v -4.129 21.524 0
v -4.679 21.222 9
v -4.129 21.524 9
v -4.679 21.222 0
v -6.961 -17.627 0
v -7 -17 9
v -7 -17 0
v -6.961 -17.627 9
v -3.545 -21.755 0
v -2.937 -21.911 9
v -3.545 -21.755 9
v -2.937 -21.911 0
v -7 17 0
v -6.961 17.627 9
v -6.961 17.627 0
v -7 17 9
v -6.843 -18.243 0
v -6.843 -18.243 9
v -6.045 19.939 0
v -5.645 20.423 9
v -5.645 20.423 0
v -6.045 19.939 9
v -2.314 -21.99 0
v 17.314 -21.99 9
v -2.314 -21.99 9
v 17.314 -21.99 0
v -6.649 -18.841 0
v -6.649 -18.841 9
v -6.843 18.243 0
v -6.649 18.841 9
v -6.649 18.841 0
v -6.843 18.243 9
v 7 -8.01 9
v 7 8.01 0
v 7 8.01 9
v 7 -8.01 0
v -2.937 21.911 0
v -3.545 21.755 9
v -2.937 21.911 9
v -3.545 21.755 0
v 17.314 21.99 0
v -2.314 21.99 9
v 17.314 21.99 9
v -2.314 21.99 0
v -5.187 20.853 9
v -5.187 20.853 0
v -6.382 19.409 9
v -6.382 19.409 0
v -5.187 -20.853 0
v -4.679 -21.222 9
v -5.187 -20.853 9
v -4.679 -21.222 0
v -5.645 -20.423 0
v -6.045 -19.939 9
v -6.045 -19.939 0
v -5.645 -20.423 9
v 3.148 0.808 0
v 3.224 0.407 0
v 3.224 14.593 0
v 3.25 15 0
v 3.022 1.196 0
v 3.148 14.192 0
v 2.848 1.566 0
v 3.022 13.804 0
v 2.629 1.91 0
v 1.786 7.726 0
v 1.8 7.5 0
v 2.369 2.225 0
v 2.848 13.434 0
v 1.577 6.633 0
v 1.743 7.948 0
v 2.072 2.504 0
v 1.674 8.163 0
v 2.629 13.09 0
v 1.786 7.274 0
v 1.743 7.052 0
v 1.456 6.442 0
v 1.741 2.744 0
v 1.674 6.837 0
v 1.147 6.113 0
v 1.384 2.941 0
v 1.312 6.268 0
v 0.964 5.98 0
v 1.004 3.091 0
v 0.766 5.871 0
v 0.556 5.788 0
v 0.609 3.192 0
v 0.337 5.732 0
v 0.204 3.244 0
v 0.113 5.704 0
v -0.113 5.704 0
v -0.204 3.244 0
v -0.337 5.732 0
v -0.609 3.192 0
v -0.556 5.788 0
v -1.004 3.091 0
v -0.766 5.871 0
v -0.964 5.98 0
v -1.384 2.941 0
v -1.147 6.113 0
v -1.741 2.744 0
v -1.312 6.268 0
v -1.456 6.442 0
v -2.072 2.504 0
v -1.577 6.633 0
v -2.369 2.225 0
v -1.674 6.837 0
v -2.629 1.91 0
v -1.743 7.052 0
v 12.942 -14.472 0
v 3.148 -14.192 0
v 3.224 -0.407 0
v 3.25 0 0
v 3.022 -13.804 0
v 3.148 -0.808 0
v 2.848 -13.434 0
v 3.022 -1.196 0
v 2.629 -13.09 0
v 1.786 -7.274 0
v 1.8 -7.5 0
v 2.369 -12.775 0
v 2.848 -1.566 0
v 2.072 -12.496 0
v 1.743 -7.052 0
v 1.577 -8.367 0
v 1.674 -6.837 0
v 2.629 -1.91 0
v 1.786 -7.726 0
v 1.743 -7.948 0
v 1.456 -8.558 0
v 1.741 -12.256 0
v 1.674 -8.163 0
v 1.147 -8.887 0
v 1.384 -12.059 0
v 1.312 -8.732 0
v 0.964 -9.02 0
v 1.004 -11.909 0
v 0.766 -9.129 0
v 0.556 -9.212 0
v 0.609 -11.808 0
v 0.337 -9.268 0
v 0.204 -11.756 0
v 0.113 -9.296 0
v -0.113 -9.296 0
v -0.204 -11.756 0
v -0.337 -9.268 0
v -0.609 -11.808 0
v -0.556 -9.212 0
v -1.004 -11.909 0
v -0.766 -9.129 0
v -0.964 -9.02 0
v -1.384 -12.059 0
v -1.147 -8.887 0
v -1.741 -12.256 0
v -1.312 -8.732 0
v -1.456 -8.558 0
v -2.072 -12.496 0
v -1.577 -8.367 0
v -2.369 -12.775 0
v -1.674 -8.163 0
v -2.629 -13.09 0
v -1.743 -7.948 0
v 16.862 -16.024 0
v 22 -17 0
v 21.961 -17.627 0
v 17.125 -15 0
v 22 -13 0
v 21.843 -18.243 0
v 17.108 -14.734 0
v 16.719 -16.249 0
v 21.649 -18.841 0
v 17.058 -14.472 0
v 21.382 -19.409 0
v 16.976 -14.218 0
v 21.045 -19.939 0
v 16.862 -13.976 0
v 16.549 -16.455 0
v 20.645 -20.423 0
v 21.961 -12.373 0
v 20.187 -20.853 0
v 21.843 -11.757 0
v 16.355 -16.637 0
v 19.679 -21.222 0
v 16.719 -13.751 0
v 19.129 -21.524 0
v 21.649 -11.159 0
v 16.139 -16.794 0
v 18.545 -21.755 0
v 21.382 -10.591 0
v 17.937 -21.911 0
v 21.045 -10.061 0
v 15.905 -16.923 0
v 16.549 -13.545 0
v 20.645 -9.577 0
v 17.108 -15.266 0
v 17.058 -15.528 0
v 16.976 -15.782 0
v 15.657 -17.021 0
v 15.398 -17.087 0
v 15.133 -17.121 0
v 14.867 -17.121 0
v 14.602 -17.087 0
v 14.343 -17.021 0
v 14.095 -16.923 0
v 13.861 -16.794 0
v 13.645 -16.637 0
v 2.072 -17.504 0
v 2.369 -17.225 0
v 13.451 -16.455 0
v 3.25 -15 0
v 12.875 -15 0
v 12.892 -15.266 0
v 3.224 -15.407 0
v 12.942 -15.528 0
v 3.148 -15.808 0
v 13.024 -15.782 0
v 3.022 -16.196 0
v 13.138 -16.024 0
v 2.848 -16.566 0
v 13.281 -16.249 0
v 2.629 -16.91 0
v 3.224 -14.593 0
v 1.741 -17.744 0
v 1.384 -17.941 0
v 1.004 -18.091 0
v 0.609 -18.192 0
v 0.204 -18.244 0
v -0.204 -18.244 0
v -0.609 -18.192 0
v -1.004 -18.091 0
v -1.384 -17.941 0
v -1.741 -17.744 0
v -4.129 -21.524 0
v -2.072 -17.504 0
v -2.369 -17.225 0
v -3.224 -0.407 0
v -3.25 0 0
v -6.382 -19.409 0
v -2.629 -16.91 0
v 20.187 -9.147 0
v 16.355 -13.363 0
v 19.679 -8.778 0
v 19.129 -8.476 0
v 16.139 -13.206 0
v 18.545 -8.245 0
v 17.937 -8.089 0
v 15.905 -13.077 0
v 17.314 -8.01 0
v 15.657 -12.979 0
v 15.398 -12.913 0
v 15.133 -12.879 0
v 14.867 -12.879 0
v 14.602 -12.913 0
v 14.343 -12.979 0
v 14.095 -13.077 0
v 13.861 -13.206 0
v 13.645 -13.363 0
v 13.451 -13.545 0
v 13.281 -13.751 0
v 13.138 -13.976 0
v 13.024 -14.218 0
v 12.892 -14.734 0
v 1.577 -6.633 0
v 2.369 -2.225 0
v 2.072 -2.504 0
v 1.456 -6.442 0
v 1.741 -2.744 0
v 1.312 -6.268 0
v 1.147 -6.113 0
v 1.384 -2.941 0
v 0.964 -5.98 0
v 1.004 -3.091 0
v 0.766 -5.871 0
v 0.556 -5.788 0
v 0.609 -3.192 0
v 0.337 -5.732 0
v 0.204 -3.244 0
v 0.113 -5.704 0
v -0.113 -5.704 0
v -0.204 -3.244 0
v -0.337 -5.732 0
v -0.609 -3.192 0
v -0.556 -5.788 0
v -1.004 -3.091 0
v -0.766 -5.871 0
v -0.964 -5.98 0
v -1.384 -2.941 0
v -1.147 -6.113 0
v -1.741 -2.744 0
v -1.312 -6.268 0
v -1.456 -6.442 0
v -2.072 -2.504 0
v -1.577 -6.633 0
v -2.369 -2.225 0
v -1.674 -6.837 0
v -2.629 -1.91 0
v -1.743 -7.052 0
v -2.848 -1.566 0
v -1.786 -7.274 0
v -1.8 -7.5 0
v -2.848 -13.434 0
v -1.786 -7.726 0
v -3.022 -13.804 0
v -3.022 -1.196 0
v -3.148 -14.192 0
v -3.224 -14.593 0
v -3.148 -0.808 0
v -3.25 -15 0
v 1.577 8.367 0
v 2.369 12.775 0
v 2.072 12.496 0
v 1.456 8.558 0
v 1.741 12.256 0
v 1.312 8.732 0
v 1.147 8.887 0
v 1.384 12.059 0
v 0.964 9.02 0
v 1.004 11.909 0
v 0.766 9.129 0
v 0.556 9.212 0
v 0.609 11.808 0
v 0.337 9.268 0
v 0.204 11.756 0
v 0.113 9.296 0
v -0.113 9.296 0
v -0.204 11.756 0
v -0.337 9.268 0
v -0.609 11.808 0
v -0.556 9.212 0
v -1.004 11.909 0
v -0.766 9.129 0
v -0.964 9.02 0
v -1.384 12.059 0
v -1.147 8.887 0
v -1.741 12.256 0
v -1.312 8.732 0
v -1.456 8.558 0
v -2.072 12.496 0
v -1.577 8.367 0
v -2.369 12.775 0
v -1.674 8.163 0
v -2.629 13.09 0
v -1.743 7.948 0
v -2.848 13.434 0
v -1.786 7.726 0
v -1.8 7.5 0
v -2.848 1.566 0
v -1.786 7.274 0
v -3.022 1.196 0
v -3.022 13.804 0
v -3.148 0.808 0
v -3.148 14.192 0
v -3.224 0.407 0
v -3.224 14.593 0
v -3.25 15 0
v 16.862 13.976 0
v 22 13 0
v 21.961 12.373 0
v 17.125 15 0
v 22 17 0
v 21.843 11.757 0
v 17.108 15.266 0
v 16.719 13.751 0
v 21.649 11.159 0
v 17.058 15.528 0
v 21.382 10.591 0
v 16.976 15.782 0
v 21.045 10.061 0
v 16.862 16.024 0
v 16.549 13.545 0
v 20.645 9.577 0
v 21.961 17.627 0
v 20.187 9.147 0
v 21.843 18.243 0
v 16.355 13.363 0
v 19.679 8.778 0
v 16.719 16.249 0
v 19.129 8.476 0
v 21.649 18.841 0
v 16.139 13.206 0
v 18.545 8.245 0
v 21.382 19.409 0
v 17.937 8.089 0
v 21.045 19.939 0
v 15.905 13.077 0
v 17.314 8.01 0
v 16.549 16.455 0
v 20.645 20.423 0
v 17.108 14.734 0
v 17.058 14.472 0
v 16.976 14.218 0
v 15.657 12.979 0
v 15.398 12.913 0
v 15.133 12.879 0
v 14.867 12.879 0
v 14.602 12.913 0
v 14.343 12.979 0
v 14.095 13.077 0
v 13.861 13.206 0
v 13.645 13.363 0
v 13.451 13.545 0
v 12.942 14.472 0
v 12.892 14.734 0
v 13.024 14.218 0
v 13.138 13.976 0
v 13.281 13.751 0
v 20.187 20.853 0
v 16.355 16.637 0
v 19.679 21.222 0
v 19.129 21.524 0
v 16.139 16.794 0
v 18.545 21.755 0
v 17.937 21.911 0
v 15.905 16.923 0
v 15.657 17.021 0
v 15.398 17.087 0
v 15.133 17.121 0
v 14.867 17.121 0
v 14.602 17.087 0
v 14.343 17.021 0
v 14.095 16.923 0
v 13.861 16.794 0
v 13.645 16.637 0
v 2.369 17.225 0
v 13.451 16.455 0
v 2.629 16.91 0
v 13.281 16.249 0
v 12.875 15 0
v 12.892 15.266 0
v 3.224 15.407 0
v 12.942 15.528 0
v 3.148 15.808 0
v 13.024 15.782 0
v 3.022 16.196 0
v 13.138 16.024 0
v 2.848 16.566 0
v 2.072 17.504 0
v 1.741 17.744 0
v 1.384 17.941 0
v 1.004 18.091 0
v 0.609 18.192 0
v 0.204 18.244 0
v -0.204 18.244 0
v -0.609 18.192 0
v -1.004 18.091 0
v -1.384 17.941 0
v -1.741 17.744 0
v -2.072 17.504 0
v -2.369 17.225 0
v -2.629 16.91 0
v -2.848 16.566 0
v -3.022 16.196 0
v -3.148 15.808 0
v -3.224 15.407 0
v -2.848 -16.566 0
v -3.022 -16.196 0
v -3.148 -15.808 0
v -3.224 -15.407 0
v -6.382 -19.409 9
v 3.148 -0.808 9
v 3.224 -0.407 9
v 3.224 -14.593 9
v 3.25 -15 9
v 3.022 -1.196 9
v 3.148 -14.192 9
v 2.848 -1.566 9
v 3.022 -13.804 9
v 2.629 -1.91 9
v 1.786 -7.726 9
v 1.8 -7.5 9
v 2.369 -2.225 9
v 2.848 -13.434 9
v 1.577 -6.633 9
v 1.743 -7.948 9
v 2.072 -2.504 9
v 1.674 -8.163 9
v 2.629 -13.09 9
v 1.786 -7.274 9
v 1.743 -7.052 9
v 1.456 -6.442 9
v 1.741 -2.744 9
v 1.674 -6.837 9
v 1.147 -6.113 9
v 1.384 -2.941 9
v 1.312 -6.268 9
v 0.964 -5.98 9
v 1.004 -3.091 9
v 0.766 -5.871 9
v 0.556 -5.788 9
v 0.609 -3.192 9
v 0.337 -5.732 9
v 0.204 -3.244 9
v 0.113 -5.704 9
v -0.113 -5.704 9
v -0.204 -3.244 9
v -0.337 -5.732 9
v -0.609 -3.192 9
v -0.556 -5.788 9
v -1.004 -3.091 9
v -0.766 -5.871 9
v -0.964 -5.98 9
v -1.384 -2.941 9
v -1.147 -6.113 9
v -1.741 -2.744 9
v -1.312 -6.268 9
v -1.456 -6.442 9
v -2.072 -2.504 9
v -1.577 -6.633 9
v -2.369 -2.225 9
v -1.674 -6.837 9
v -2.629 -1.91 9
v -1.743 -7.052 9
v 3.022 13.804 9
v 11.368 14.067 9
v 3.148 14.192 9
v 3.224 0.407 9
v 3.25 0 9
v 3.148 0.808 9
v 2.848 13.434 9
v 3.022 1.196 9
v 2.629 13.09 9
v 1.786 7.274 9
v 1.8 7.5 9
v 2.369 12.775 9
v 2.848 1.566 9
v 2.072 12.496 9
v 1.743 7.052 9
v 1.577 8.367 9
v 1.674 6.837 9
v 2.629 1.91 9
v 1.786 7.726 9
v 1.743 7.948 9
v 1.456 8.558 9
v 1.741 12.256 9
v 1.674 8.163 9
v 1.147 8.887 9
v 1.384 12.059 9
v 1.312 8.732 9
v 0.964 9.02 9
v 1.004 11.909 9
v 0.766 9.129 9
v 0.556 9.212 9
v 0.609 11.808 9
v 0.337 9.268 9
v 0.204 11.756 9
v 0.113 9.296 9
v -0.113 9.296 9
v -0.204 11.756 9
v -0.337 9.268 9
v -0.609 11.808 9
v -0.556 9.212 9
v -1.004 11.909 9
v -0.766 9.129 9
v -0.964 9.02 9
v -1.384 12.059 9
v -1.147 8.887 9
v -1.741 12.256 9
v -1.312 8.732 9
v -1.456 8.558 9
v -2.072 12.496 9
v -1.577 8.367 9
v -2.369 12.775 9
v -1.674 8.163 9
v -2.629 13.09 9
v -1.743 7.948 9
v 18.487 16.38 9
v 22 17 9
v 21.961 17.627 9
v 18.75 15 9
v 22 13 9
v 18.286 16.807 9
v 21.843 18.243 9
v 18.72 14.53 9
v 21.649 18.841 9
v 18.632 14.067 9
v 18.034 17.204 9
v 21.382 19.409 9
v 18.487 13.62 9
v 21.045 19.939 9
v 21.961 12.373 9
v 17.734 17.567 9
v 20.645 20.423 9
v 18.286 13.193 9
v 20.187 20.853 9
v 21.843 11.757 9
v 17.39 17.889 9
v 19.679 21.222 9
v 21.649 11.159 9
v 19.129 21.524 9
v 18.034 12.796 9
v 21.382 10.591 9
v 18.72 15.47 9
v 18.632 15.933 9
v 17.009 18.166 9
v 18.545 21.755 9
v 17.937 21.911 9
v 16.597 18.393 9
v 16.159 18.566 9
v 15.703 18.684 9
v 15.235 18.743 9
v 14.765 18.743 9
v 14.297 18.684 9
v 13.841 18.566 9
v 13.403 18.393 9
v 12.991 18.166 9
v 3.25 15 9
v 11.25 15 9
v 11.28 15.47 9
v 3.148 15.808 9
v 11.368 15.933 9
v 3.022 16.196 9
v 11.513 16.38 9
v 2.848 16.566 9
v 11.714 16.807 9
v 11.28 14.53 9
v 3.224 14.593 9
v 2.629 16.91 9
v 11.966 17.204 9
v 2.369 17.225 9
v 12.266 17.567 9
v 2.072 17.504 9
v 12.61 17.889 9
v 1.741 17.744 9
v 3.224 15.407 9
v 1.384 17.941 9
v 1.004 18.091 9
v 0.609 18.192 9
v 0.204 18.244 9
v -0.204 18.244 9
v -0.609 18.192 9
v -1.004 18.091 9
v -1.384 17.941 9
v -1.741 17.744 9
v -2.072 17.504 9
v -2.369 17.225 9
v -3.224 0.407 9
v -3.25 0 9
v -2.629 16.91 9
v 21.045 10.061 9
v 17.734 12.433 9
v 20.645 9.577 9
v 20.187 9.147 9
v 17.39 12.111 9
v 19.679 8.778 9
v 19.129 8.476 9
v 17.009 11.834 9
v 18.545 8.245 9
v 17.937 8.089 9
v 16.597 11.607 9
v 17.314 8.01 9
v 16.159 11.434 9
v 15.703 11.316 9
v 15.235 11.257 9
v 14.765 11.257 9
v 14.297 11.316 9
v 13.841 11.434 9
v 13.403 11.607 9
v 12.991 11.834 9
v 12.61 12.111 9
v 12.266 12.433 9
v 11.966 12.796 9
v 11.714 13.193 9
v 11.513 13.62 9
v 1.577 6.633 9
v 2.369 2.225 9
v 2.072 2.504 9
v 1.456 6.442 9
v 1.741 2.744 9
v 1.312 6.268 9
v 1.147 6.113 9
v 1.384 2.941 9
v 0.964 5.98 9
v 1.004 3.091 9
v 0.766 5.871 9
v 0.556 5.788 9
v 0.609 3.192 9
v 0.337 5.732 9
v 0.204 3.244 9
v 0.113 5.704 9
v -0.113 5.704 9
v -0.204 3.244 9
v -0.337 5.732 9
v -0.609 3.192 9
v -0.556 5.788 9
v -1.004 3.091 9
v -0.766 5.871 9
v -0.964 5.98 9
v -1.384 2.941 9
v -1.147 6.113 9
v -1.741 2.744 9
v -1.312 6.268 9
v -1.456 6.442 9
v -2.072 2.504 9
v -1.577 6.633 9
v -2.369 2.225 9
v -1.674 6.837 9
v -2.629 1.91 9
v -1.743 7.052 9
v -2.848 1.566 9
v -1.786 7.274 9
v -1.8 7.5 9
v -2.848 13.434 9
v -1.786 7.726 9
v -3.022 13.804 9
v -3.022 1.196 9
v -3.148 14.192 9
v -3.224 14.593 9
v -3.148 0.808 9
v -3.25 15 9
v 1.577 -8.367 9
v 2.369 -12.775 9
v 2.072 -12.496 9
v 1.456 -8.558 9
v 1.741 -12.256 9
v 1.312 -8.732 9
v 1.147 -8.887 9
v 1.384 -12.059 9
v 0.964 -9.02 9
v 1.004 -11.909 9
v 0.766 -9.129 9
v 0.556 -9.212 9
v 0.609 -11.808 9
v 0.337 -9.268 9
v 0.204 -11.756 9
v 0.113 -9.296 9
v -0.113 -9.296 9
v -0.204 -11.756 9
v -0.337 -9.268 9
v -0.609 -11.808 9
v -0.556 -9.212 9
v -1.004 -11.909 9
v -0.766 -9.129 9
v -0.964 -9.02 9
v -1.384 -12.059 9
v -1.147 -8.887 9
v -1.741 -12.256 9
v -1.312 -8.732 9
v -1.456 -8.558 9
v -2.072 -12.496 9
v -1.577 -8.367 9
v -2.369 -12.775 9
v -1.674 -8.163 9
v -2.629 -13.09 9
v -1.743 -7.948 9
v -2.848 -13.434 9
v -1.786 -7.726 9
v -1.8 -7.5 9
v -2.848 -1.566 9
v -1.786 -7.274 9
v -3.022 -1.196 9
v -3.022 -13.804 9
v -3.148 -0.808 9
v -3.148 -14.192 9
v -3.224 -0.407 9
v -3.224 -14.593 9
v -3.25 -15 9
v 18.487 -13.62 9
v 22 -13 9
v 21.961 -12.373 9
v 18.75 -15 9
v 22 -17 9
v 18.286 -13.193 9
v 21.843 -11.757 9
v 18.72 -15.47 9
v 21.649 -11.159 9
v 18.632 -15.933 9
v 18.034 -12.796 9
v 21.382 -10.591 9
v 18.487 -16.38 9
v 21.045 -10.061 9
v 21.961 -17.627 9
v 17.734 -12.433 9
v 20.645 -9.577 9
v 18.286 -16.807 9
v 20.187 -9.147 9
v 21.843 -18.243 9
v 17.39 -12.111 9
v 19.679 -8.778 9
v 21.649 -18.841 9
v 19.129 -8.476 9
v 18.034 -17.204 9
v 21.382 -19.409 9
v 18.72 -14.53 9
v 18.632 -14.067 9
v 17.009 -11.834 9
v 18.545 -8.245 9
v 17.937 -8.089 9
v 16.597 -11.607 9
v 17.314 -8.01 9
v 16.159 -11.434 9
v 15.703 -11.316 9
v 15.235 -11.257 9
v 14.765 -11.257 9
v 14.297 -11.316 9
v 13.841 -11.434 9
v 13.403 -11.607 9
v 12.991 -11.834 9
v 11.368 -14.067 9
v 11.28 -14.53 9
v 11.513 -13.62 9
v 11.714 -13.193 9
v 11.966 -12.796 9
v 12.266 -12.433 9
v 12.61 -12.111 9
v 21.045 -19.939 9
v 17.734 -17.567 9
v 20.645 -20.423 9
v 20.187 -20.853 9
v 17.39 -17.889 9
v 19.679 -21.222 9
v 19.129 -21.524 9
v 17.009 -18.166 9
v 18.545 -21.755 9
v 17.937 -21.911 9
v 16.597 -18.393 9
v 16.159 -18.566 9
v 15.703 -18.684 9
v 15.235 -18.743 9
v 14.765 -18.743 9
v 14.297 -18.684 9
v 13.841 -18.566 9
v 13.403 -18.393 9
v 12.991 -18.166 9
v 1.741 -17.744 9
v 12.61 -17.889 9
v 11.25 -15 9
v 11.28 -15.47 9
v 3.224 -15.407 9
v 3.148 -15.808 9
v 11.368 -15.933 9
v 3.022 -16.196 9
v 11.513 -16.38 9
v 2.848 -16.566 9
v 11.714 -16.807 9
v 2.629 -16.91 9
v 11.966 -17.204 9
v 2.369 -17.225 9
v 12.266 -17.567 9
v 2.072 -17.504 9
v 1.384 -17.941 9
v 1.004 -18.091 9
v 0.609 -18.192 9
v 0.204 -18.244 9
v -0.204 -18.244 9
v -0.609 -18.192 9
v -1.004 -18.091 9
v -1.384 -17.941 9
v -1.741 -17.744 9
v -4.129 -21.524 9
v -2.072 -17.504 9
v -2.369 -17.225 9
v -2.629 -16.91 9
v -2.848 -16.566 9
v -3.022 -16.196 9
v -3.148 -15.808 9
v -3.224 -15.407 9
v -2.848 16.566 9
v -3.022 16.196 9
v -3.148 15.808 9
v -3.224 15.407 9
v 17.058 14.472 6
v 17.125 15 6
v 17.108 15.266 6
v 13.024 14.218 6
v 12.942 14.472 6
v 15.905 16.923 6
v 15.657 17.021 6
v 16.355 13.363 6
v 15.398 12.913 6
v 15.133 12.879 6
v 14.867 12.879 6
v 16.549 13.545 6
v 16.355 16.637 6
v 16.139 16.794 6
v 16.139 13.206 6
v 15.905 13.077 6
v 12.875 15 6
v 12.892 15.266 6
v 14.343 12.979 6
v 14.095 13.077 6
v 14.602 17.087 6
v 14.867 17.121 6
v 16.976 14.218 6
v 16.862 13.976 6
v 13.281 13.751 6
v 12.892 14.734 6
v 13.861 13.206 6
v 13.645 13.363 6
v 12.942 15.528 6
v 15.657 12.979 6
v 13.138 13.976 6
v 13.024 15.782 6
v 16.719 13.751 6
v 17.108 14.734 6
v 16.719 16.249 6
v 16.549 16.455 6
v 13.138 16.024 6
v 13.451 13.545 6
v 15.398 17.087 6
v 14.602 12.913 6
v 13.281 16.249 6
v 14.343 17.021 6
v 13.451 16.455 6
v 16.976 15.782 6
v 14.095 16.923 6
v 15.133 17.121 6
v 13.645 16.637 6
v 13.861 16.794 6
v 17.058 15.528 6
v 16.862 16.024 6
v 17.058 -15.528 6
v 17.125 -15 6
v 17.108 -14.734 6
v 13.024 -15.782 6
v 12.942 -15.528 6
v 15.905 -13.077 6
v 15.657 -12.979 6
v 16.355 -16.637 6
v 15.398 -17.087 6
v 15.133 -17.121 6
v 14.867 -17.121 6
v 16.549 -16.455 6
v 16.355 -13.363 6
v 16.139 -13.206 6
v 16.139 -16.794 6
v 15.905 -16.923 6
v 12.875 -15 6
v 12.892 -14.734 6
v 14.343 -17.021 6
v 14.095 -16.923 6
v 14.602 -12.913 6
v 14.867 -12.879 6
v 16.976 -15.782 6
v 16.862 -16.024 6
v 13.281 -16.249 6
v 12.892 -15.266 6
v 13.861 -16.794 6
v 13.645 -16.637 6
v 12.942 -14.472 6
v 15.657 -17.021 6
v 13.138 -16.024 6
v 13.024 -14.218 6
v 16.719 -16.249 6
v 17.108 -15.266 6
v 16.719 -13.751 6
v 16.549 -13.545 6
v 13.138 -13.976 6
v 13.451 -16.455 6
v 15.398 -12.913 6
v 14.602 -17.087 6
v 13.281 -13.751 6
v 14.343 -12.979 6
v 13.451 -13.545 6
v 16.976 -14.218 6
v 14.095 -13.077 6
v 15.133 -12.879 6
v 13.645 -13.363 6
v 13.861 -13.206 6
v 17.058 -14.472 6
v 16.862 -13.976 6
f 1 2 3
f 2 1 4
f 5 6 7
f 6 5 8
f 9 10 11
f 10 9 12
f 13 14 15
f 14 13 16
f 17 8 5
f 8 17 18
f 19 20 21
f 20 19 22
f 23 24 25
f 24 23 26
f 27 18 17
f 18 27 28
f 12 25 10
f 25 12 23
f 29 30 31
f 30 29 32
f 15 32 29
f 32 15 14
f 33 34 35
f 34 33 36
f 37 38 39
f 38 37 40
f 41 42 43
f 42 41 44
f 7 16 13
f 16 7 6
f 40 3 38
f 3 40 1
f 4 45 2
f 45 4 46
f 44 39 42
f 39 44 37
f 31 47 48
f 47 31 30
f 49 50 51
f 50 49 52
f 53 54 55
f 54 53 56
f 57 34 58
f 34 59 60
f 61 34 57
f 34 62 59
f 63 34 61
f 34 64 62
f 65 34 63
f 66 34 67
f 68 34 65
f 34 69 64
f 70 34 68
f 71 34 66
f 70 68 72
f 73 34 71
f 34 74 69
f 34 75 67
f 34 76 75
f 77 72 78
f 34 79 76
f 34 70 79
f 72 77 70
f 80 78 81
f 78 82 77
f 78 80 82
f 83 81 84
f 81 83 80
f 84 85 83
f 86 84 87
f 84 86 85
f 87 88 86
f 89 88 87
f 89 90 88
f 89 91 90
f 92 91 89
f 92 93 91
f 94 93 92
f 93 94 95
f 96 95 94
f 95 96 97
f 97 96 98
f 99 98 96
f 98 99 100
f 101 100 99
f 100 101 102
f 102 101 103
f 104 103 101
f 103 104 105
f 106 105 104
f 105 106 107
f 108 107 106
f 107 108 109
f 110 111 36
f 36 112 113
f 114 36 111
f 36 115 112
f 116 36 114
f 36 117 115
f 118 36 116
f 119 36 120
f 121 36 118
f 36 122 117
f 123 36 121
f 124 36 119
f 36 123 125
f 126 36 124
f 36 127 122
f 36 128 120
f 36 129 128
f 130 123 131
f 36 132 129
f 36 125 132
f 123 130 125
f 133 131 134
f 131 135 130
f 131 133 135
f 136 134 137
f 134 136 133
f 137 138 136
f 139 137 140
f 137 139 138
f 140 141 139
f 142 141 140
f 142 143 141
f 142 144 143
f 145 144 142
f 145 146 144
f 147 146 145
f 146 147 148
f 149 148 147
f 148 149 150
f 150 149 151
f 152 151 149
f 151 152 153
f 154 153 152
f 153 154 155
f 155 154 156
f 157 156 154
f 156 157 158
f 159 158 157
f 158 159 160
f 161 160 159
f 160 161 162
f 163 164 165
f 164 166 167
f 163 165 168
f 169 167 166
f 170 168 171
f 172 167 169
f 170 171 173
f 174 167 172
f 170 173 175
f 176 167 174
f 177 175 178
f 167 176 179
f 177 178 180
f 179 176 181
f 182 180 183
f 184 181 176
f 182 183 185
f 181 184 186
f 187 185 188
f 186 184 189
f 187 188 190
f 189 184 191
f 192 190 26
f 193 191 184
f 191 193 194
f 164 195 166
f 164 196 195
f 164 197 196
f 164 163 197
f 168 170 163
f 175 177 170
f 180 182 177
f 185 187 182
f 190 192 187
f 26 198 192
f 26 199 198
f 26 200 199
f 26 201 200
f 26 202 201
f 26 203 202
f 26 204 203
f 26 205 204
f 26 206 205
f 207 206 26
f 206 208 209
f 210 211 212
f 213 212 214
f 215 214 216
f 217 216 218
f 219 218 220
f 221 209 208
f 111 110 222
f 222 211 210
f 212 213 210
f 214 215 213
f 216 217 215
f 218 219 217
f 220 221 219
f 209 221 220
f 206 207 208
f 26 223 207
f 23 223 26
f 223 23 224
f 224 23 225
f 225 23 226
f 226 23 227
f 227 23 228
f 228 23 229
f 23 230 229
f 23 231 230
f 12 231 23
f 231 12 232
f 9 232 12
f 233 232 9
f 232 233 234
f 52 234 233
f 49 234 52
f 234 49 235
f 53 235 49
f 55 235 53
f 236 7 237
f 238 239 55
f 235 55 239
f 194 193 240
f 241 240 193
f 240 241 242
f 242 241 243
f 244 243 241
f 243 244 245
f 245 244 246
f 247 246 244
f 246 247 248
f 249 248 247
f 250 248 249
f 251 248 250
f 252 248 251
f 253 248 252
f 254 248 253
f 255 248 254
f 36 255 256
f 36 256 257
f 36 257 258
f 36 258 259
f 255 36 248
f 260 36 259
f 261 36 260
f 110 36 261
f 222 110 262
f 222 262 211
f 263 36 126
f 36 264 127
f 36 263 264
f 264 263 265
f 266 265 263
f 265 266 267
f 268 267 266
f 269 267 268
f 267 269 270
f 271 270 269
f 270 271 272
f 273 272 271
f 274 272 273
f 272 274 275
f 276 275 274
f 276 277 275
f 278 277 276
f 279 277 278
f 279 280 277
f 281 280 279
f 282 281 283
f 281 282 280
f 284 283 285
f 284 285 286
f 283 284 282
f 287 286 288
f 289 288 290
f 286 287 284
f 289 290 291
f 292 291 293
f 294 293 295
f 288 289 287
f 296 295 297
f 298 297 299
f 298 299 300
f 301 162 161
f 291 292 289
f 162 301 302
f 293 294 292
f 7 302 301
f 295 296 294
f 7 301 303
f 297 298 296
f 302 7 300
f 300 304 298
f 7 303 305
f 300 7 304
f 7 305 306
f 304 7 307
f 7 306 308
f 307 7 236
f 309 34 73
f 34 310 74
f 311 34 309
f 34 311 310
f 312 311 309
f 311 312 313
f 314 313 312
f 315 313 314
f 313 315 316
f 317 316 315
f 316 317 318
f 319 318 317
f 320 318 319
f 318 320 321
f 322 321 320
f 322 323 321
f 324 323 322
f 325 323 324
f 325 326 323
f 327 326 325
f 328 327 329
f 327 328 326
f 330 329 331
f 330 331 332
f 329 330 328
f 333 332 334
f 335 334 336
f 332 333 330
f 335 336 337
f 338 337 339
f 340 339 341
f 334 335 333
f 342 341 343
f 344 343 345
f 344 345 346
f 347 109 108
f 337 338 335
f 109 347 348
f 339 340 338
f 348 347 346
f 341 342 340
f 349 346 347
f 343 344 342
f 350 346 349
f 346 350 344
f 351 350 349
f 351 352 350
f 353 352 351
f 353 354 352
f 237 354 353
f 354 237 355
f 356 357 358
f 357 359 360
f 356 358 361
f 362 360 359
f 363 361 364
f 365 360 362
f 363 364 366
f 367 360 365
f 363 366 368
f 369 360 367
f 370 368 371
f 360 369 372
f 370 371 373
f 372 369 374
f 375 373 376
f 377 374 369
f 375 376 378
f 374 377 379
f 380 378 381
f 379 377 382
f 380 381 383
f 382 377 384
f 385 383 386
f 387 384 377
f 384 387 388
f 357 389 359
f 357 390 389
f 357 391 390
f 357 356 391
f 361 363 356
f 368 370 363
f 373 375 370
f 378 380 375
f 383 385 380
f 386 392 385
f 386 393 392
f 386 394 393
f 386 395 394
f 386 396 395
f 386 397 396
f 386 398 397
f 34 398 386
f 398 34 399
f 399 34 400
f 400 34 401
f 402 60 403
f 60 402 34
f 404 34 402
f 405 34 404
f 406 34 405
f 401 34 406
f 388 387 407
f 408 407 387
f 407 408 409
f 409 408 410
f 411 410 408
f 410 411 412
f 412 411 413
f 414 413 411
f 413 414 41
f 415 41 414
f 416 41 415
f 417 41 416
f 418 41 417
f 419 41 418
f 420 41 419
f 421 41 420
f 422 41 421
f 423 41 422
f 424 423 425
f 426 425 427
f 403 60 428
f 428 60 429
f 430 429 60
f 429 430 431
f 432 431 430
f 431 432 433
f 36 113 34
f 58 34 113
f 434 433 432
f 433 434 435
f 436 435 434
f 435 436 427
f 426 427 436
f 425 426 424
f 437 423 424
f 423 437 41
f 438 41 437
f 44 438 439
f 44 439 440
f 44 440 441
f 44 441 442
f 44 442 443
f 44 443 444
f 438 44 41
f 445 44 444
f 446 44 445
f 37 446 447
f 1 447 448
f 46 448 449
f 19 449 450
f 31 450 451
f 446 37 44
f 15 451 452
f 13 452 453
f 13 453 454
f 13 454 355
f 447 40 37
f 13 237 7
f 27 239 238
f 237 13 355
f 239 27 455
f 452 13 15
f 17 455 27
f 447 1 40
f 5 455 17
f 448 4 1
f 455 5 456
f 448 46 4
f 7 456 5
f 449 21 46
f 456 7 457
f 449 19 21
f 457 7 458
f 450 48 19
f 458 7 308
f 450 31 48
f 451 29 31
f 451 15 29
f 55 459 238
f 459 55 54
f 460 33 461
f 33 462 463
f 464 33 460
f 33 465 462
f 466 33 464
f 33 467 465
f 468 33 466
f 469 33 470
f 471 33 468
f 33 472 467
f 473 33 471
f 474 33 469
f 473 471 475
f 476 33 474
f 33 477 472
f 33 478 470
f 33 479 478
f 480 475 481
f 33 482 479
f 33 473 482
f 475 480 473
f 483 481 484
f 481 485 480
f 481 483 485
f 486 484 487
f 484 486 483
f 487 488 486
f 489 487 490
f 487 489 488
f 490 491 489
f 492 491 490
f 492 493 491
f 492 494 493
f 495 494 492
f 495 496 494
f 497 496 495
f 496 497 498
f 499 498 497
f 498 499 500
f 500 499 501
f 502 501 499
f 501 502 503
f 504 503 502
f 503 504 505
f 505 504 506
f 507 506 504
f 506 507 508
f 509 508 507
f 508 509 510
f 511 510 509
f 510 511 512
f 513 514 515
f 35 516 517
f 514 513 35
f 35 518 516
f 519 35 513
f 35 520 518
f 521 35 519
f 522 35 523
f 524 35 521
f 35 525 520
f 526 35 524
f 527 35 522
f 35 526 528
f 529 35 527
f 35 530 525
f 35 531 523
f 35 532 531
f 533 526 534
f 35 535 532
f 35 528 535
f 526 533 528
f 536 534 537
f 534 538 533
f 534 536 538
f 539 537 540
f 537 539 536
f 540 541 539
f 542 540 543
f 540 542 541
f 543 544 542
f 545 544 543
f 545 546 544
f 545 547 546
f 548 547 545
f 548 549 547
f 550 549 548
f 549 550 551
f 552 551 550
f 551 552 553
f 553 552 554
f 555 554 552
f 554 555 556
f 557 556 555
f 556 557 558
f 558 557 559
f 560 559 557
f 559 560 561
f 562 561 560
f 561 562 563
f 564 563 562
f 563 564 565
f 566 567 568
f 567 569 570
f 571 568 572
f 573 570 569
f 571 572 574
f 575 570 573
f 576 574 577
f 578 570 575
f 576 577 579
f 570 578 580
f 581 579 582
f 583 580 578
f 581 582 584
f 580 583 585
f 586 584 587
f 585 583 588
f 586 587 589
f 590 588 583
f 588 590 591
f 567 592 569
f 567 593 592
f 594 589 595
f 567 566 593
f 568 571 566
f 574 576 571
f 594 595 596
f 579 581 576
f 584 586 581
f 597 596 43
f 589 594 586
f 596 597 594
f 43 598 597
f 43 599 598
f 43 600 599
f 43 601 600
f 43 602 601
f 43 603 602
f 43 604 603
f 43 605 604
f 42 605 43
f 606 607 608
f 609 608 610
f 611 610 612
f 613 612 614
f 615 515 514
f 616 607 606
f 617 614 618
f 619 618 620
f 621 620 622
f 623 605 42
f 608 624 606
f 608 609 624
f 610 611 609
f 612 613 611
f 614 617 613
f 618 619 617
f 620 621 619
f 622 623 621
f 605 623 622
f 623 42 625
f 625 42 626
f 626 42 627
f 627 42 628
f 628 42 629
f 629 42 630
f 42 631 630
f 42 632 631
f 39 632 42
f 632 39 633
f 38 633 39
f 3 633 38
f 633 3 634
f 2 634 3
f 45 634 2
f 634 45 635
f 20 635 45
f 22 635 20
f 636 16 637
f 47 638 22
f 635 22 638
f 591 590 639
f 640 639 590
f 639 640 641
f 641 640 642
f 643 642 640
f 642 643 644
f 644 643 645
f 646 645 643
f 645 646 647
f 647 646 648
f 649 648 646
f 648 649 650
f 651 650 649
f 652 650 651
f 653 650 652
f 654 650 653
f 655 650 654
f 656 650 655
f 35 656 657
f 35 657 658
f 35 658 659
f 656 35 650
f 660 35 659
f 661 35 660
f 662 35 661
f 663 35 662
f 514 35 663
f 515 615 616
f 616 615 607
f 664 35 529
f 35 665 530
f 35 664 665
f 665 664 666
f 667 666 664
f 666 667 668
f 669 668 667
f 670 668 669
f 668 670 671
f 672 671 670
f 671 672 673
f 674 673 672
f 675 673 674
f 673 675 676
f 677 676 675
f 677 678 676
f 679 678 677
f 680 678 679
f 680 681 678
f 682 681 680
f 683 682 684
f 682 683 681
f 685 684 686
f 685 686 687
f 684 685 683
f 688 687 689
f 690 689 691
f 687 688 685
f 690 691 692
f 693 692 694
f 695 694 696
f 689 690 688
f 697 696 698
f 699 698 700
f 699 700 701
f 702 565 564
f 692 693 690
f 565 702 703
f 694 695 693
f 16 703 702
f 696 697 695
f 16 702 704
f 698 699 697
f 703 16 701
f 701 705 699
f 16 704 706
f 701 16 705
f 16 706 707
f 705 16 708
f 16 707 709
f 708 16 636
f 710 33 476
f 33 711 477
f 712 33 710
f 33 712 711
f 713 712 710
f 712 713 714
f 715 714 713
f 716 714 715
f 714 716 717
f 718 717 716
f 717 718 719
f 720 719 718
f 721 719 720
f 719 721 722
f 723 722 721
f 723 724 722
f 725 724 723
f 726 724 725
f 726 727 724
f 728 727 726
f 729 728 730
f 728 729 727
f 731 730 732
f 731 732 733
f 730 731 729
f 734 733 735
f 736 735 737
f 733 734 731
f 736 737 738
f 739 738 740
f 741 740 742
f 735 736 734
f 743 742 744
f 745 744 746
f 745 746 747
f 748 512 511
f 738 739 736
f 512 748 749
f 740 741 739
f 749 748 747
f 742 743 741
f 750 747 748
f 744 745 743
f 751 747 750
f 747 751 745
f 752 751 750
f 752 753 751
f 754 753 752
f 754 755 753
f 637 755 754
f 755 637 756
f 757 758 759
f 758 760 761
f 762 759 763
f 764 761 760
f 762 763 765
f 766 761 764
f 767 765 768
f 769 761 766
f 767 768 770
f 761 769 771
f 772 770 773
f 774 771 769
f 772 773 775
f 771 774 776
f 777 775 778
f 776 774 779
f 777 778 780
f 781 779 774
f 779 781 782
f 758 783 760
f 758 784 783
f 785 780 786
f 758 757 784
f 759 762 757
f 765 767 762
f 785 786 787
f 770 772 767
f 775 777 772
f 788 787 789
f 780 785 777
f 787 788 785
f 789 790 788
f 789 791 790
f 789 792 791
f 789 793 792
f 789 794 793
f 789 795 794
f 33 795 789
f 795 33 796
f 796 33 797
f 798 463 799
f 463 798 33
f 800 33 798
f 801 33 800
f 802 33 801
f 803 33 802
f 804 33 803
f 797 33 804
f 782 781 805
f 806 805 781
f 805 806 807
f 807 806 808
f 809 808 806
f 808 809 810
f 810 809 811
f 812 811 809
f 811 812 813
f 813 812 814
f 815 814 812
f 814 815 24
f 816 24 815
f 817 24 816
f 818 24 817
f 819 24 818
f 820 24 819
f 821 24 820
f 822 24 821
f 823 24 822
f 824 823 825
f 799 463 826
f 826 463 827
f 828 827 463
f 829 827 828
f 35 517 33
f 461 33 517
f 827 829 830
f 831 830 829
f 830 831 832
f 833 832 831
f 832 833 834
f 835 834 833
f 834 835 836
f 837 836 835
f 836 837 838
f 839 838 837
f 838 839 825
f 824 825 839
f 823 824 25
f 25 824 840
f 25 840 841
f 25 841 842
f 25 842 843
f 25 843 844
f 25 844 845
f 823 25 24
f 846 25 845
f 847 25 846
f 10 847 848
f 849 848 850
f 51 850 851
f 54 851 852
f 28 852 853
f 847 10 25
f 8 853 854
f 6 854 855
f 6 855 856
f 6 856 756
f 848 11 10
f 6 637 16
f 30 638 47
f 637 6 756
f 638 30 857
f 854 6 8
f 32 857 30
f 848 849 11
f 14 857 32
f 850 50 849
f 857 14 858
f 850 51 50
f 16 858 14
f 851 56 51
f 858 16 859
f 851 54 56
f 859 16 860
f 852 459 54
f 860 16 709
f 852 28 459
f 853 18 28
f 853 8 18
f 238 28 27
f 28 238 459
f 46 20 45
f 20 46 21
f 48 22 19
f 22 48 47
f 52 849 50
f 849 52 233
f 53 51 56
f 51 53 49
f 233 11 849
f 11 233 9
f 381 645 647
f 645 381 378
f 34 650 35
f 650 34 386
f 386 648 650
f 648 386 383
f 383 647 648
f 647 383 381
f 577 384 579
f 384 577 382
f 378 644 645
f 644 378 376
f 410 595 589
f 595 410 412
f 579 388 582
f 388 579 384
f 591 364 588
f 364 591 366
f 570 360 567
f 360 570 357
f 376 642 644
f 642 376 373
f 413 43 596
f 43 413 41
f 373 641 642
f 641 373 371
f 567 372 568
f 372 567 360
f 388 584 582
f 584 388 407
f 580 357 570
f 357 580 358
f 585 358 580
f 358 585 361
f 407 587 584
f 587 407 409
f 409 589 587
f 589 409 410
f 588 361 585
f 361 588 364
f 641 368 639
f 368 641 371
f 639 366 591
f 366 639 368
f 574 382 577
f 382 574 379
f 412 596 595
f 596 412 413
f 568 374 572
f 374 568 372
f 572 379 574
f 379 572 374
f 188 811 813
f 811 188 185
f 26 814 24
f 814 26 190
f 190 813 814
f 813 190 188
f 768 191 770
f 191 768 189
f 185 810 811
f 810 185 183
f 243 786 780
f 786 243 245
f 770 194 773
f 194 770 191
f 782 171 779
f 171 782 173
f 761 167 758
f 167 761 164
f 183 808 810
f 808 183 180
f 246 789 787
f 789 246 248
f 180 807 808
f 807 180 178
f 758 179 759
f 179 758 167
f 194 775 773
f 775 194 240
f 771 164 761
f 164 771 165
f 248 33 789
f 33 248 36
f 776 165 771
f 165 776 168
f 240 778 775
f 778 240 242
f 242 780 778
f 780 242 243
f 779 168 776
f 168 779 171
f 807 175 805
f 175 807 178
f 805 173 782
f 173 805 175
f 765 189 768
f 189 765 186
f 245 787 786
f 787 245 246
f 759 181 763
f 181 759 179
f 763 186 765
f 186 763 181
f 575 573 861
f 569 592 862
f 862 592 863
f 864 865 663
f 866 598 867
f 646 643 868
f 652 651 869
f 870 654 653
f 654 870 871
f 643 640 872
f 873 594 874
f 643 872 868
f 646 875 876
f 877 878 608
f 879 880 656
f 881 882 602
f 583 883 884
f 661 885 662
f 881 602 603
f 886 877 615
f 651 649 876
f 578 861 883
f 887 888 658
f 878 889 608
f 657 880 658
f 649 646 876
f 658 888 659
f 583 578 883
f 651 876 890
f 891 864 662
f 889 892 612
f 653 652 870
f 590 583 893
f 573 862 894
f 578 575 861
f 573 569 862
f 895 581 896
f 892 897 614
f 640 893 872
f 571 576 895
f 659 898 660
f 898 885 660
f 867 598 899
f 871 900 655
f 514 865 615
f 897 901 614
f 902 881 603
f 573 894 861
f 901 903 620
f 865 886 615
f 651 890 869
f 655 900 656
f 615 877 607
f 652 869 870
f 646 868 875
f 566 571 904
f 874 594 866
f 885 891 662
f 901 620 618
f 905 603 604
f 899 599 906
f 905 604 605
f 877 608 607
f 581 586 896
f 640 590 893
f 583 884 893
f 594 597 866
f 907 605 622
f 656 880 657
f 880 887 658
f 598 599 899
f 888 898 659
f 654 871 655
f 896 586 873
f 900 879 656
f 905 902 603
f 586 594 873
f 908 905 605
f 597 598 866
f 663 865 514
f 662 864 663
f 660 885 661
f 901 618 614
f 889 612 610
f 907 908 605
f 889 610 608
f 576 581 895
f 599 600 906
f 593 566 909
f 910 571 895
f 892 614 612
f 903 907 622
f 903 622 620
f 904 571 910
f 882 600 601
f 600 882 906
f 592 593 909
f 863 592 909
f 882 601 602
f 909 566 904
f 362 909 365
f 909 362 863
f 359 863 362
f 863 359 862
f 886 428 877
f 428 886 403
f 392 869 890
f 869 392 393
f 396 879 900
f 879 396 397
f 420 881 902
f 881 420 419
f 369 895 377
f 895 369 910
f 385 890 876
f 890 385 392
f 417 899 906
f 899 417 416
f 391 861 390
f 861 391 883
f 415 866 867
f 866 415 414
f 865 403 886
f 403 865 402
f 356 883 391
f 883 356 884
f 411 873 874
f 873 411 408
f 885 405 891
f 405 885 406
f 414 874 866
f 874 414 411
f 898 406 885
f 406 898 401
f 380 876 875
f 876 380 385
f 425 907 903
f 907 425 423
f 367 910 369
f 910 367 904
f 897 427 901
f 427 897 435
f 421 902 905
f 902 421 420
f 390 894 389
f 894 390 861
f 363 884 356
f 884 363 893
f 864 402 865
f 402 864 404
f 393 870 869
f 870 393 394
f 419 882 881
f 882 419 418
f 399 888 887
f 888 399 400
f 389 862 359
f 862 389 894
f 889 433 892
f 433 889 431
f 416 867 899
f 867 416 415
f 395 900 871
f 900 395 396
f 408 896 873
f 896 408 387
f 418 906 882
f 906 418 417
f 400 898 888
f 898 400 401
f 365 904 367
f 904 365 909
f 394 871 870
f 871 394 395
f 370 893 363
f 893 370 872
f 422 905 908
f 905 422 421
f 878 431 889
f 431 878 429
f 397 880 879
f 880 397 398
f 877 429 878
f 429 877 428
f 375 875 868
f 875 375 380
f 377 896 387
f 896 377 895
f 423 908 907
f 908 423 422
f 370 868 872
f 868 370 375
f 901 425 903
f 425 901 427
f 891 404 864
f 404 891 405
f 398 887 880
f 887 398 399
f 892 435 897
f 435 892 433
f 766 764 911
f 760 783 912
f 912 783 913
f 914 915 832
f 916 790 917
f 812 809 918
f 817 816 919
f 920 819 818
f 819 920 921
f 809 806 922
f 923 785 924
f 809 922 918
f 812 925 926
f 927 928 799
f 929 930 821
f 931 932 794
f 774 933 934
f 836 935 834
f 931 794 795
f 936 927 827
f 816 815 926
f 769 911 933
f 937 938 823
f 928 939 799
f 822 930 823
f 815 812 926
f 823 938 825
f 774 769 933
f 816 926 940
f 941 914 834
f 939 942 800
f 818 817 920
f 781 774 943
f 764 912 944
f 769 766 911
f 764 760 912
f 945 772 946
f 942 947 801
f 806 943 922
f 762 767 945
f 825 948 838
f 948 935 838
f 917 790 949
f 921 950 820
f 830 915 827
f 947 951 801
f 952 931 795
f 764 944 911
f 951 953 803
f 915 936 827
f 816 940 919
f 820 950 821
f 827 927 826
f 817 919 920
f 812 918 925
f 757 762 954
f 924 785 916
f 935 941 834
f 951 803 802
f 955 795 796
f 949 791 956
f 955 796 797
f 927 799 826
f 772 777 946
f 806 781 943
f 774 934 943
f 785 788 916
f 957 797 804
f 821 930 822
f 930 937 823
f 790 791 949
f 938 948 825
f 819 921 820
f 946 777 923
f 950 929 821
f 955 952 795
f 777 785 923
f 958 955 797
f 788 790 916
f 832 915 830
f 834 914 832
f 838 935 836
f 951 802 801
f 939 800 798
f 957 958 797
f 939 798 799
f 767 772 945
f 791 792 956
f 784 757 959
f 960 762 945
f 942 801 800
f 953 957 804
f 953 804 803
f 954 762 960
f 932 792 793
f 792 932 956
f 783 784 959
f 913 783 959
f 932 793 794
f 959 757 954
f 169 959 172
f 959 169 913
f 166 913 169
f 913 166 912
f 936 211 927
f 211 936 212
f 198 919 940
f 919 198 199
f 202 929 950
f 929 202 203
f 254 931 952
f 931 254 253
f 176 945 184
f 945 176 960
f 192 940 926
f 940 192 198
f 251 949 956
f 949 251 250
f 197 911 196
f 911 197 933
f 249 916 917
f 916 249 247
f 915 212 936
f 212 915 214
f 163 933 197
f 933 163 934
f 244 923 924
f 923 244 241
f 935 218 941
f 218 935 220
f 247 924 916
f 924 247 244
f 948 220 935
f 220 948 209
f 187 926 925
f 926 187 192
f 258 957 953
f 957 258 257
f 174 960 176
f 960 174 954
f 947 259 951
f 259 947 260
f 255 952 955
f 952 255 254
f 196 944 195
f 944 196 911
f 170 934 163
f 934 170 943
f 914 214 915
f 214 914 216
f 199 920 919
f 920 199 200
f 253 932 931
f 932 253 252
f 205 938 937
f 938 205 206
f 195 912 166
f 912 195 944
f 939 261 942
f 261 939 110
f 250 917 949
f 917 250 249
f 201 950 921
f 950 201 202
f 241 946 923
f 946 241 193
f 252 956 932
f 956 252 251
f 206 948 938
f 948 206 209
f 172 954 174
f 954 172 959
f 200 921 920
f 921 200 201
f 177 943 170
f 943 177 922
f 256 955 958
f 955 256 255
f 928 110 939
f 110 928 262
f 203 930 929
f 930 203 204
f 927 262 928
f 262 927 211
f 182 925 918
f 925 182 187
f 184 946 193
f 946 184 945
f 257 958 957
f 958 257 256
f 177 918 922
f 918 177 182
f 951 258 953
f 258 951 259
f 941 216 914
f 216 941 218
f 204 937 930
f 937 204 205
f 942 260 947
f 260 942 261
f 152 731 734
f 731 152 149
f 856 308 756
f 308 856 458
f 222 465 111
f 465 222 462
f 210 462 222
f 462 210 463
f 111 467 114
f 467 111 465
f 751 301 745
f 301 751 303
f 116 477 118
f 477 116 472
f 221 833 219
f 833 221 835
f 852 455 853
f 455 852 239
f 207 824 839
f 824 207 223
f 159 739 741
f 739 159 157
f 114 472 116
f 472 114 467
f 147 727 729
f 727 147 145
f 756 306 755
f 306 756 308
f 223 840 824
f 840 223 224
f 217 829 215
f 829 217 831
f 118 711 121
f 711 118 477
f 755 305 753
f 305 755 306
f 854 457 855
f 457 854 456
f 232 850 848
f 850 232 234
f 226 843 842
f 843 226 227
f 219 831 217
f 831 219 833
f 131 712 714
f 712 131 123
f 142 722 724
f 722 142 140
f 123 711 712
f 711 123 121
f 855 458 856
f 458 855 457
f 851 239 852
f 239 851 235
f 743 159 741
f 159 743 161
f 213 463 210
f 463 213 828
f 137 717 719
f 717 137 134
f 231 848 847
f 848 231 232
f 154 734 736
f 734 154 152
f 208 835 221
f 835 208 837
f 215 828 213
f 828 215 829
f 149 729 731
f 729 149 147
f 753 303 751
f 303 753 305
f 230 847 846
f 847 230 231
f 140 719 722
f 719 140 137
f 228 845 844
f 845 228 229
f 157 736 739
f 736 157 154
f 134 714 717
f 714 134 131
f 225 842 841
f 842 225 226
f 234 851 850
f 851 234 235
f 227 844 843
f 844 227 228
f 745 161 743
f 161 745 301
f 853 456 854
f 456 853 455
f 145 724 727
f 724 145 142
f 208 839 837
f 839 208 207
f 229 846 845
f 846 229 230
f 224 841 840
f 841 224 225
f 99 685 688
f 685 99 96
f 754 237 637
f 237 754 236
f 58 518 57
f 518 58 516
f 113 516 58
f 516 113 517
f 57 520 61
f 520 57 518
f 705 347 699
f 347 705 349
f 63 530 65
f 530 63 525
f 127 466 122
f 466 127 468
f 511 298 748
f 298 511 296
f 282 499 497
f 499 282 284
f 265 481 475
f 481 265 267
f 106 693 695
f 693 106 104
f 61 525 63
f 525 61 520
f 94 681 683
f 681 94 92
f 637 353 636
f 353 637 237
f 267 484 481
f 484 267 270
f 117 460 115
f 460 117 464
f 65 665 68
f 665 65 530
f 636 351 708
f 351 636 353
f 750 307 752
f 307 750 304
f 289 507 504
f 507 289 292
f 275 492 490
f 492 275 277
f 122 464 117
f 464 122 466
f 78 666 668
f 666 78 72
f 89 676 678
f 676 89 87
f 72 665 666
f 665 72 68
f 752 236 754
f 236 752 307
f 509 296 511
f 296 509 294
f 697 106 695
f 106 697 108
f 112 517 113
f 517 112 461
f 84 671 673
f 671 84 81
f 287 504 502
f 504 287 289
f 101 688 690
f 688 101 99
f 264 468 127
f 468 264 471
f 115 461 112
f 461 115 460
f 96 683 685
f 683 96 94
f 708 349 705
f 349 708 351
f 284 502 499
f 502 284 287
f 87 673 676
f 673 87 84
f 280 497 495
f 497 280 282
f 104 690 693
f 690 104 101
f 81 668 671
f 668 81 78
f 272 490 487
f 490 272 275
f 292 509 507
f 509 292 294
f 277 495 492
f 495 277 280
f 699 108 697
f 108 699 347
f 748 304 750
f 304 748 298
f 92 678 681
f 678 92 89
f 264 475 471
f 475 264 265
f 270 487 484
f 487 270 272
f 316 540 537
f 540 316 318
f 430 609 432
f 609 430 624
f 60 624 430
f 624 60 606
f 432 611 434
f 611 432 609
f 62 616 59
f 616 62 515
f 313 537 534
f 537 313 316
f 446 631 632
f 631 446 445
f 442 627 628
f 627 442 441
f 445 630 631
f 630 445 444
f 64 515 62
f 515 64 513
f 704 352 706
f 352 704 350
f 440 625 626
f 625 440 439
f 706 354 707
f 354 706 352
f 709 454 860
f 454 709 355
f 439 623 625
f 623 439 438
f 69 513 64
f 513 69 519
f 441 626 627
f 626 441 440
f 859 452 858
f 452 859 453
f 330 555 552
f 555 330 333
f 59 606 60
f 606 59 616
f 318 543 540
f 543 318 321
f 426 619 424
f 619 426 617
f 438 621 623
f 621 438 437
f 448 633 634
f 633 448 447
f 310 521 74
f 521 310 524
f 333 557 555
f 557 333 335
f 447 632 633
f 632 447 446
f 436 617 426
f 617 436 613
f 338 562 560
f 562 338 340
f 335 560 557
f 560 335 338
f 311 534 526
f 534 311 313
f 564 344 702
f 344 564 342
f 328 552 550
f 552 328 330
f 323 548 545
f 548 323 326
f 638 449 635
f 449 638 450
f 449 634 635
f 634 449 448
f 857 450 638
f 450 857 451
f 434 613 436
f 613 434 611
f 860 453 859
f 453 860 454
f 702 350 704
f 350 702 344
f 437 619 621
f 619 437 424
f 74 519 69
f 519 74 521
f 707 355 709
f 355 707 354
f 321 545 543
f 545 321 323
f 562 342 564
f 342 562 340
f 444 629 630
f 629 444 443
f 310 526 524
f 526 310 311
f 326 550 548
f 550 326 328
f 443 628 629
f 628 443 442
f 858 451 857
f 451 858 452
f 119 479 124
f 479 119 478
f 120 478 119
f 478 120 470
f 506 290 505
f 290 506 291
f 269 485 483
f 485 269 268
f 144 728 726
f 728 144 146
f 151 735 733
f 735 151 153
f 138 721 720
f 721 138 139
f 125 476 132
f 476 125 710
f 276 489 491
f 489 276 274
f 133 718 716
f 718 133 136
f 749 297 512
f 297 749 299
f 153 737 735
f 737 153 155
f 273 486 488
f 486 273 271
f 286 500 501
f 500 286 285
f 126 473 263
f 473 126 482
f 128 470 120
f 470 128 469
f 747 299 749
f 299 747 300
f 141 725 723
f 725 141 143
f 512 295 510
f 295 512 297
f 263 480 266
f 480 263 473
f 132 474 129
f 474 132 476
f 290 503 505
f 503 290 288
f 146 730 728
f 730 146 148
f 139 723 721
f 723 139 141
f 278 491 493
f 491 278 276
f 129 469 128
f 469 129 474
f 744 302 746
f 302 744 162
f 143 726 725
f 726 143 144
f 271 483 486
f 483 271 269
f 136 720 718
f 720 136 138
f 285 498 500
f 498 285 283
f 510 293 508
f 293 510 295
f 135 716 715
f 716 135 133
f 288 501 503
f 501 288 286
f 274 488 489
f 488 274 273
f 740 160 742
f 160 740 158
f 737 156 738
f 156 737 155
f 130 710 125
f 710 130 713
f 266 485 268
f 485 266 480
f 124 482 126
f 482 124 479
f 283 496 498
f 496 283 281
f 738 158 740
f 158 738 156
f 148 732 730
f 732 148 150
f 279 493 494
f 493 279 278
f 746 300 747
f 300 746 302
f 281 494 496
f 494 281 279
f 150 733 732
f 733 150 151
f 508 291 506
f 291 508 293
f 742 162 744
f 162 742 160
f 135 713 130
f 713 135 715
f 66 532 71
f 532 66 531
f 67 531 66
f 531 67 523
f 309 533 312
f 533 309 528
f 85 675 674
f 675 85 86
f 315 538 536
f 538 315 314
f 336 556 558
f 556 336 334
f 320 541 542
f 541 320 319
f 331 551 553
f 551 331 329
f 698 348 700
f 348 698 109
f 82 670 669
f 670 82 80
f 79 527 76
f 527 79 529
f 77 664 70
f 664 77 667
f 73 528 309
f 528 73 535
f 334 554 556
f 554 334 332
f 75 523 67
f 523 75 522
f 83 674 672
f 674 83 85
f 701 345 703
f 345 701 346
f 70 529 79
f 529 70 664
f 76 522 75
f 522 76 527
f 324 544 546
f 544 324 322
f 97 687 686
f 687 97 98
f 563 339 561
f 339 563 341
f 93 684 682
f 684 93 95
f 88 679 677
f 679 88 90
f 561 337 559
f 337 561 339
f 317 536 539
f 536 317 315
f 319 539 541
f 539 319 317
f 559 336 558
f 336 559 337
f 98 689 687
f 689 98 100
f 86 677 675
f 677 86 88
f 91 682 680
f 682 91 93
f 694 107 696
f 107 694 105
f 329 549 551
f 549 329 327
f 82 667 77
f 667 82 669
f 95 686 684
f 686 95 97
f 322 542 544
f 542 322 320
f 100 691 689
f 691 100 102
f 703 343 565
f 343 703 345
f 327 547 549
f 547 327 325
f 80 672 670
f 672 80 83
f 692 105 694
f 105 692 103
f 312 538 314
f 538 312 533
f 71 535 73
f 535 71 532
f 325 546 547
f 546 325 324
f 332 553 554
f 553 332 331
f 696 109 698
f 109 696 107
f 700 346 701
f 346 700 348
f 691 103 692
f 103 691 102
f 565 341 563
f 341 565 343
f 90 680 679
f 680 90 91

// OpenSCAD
$fn = 50;


difference() {
	union() {
		hull() {
			translate(v = [-2.0000000000, 17.0000000000, 0]) {
				cylinder(h = 9, r = 5);
			}
			translate(v = [2.0000000000, 17.0000000000, 0]) {
				cylinder(h = 9, r = 5);
			}
			translate(v = [-2.0000000000, -17.0000000000, 0]) {
				cylinder(h = 9, r = 5);
			}
			translate(v = [2.0000000000, -17.0000000000, 0]) {
				cylinder(h = 9, r = 5);
			}
		}
		translate(v = [7.5000000000, 15.0000000000, 0]) {
			hull() {
				translate(v = [-9.5000000000, 2.0000000000, 0]) {
					cylinder(h = 9, r = 5);
				}
				translate(v = [9.5000000000, 2.0000000000, 0]) {
					cylinder(h = 9, r = 5);
				}
				translate(v = [-9.5000000000, -2.0000000000, 0]) {
					cylinder(h = 9, r = 5);
				}
				translate(v = [9.5000000000, -2.0000000000, 0]) {
					cylinder(h = 9, r = 5);
				}
			}
		}
		translate(v = [7.5000000000, -15.0000000000, 0]) {
			hull() {
				translate(v = [-9.5000000000, 2.0000000000, 0]) {
					cylinder(h = 9, r = 5);
				}
				translate(v = [9.5000000000, 2.0000000000, 0]) {
					cylinder(h = 9, r = 5);
				}
				translate(v = [-9.5000000000, -2.0000000000, 0]) {
					cylinder(h = 9, r = 5);
				}
				translate(v = [9.5000000000, -2.0000000000, 0]) {
					cylinder(h = 9, r = 5);
				}
			}
		}
	}
	union() {
		translate(v = [15.0000000000, 15.0000000000, 9]) {
			rotate(a = [0, 0, 0]) {
				difference() {
					union() {
						#translate(v = [0, 0, -9.0000000000]) {
							cylinder(h = 9, r = 2.0000000000);
						}
						#translate(v = [0, 0, -3]) {
							cylinder(h = 3, r1 = 2.1250000000, r2 = 3.7500000000);
						}
						#translate(v = [0, 0, -9.0000000000]) {
							cylinder(h = 9, r = 2.1250000000);
						}
						#translate(v = [0, 0, -9.0000000000]) {
							cylinder(h = 9, r = 2.0000000000);
						}
					}
					union();
				}
			}
		}
		translate(v = [15.0000000000, -15.0000000000, 9]) {
			rotate(a = [0, 0, 0]) {
				difference() {
					union() {
						#translate(v = [0, 0, -9.0000000000]) {
							cylinder(h = 9, r = 2.0000000000);
						}
						#translate(v = [0, 0, -3]) {
							cylinder(h = 3, r1 = 2.1250000000, r2 = 3.7500000000);
						}
						#translate(v = [0, 0, -9.0000000000]) {
							cylinder(h = 9, r = 2.1250000000);
						}
						#translate(v = [0, 0, -9.0000000000]) {
							cylinder(h = 9, r = 2.0000000000);
						}
					}
					union();
				}
			}
		}
		translate(v = [0.0000000000, -15.0000000000, 0]) {
			translate(v = [0, 0, -100]) {
				cylinder(h = 200, r = 3.2500000000);
			}
		}
		translate(v = [0, 0, -100]) {
			cylinder(h = 200, r = 3.2500000000);
		}
		translate(v = [0.0000000000, 15.0000000000, 0]) {
			translate(v = [0, 0, -100]) {
				cylinder(h = 200, r = 3.2500000000);
			}
		}
		translate(v = [0.0000000000, -15.0000000000, 0]) {
			translate(v = [0, 0, -100]) {
				cylinder(h = 200, r = 1.8000000000);
			}
		}
		translate(v = [0.0000000000, -7.5000000000, 0]) {
			translate(v = [0, 0, -100]) {
				cylinder(h = 200, r = 1.8000000000);
			}
		}
		translate(v = [0, 0, -100]) {
			cylinder(h = 200, r = 1.8000000000);
		}
		translate(v = [0.0000000000, 7.5000000000, 0]) {
			translate(v = [0, 0, -100]) {
				cylinder(h = 200, r = 1.8000000000);
			}
		}
		translate(v = [0.0000000000, 15.0000000000, 0]) {
			translate(v = [0, 0, -100]) {
				cylinder(h = 200, r = 1.8000000000);
			}
		}
	}
}
